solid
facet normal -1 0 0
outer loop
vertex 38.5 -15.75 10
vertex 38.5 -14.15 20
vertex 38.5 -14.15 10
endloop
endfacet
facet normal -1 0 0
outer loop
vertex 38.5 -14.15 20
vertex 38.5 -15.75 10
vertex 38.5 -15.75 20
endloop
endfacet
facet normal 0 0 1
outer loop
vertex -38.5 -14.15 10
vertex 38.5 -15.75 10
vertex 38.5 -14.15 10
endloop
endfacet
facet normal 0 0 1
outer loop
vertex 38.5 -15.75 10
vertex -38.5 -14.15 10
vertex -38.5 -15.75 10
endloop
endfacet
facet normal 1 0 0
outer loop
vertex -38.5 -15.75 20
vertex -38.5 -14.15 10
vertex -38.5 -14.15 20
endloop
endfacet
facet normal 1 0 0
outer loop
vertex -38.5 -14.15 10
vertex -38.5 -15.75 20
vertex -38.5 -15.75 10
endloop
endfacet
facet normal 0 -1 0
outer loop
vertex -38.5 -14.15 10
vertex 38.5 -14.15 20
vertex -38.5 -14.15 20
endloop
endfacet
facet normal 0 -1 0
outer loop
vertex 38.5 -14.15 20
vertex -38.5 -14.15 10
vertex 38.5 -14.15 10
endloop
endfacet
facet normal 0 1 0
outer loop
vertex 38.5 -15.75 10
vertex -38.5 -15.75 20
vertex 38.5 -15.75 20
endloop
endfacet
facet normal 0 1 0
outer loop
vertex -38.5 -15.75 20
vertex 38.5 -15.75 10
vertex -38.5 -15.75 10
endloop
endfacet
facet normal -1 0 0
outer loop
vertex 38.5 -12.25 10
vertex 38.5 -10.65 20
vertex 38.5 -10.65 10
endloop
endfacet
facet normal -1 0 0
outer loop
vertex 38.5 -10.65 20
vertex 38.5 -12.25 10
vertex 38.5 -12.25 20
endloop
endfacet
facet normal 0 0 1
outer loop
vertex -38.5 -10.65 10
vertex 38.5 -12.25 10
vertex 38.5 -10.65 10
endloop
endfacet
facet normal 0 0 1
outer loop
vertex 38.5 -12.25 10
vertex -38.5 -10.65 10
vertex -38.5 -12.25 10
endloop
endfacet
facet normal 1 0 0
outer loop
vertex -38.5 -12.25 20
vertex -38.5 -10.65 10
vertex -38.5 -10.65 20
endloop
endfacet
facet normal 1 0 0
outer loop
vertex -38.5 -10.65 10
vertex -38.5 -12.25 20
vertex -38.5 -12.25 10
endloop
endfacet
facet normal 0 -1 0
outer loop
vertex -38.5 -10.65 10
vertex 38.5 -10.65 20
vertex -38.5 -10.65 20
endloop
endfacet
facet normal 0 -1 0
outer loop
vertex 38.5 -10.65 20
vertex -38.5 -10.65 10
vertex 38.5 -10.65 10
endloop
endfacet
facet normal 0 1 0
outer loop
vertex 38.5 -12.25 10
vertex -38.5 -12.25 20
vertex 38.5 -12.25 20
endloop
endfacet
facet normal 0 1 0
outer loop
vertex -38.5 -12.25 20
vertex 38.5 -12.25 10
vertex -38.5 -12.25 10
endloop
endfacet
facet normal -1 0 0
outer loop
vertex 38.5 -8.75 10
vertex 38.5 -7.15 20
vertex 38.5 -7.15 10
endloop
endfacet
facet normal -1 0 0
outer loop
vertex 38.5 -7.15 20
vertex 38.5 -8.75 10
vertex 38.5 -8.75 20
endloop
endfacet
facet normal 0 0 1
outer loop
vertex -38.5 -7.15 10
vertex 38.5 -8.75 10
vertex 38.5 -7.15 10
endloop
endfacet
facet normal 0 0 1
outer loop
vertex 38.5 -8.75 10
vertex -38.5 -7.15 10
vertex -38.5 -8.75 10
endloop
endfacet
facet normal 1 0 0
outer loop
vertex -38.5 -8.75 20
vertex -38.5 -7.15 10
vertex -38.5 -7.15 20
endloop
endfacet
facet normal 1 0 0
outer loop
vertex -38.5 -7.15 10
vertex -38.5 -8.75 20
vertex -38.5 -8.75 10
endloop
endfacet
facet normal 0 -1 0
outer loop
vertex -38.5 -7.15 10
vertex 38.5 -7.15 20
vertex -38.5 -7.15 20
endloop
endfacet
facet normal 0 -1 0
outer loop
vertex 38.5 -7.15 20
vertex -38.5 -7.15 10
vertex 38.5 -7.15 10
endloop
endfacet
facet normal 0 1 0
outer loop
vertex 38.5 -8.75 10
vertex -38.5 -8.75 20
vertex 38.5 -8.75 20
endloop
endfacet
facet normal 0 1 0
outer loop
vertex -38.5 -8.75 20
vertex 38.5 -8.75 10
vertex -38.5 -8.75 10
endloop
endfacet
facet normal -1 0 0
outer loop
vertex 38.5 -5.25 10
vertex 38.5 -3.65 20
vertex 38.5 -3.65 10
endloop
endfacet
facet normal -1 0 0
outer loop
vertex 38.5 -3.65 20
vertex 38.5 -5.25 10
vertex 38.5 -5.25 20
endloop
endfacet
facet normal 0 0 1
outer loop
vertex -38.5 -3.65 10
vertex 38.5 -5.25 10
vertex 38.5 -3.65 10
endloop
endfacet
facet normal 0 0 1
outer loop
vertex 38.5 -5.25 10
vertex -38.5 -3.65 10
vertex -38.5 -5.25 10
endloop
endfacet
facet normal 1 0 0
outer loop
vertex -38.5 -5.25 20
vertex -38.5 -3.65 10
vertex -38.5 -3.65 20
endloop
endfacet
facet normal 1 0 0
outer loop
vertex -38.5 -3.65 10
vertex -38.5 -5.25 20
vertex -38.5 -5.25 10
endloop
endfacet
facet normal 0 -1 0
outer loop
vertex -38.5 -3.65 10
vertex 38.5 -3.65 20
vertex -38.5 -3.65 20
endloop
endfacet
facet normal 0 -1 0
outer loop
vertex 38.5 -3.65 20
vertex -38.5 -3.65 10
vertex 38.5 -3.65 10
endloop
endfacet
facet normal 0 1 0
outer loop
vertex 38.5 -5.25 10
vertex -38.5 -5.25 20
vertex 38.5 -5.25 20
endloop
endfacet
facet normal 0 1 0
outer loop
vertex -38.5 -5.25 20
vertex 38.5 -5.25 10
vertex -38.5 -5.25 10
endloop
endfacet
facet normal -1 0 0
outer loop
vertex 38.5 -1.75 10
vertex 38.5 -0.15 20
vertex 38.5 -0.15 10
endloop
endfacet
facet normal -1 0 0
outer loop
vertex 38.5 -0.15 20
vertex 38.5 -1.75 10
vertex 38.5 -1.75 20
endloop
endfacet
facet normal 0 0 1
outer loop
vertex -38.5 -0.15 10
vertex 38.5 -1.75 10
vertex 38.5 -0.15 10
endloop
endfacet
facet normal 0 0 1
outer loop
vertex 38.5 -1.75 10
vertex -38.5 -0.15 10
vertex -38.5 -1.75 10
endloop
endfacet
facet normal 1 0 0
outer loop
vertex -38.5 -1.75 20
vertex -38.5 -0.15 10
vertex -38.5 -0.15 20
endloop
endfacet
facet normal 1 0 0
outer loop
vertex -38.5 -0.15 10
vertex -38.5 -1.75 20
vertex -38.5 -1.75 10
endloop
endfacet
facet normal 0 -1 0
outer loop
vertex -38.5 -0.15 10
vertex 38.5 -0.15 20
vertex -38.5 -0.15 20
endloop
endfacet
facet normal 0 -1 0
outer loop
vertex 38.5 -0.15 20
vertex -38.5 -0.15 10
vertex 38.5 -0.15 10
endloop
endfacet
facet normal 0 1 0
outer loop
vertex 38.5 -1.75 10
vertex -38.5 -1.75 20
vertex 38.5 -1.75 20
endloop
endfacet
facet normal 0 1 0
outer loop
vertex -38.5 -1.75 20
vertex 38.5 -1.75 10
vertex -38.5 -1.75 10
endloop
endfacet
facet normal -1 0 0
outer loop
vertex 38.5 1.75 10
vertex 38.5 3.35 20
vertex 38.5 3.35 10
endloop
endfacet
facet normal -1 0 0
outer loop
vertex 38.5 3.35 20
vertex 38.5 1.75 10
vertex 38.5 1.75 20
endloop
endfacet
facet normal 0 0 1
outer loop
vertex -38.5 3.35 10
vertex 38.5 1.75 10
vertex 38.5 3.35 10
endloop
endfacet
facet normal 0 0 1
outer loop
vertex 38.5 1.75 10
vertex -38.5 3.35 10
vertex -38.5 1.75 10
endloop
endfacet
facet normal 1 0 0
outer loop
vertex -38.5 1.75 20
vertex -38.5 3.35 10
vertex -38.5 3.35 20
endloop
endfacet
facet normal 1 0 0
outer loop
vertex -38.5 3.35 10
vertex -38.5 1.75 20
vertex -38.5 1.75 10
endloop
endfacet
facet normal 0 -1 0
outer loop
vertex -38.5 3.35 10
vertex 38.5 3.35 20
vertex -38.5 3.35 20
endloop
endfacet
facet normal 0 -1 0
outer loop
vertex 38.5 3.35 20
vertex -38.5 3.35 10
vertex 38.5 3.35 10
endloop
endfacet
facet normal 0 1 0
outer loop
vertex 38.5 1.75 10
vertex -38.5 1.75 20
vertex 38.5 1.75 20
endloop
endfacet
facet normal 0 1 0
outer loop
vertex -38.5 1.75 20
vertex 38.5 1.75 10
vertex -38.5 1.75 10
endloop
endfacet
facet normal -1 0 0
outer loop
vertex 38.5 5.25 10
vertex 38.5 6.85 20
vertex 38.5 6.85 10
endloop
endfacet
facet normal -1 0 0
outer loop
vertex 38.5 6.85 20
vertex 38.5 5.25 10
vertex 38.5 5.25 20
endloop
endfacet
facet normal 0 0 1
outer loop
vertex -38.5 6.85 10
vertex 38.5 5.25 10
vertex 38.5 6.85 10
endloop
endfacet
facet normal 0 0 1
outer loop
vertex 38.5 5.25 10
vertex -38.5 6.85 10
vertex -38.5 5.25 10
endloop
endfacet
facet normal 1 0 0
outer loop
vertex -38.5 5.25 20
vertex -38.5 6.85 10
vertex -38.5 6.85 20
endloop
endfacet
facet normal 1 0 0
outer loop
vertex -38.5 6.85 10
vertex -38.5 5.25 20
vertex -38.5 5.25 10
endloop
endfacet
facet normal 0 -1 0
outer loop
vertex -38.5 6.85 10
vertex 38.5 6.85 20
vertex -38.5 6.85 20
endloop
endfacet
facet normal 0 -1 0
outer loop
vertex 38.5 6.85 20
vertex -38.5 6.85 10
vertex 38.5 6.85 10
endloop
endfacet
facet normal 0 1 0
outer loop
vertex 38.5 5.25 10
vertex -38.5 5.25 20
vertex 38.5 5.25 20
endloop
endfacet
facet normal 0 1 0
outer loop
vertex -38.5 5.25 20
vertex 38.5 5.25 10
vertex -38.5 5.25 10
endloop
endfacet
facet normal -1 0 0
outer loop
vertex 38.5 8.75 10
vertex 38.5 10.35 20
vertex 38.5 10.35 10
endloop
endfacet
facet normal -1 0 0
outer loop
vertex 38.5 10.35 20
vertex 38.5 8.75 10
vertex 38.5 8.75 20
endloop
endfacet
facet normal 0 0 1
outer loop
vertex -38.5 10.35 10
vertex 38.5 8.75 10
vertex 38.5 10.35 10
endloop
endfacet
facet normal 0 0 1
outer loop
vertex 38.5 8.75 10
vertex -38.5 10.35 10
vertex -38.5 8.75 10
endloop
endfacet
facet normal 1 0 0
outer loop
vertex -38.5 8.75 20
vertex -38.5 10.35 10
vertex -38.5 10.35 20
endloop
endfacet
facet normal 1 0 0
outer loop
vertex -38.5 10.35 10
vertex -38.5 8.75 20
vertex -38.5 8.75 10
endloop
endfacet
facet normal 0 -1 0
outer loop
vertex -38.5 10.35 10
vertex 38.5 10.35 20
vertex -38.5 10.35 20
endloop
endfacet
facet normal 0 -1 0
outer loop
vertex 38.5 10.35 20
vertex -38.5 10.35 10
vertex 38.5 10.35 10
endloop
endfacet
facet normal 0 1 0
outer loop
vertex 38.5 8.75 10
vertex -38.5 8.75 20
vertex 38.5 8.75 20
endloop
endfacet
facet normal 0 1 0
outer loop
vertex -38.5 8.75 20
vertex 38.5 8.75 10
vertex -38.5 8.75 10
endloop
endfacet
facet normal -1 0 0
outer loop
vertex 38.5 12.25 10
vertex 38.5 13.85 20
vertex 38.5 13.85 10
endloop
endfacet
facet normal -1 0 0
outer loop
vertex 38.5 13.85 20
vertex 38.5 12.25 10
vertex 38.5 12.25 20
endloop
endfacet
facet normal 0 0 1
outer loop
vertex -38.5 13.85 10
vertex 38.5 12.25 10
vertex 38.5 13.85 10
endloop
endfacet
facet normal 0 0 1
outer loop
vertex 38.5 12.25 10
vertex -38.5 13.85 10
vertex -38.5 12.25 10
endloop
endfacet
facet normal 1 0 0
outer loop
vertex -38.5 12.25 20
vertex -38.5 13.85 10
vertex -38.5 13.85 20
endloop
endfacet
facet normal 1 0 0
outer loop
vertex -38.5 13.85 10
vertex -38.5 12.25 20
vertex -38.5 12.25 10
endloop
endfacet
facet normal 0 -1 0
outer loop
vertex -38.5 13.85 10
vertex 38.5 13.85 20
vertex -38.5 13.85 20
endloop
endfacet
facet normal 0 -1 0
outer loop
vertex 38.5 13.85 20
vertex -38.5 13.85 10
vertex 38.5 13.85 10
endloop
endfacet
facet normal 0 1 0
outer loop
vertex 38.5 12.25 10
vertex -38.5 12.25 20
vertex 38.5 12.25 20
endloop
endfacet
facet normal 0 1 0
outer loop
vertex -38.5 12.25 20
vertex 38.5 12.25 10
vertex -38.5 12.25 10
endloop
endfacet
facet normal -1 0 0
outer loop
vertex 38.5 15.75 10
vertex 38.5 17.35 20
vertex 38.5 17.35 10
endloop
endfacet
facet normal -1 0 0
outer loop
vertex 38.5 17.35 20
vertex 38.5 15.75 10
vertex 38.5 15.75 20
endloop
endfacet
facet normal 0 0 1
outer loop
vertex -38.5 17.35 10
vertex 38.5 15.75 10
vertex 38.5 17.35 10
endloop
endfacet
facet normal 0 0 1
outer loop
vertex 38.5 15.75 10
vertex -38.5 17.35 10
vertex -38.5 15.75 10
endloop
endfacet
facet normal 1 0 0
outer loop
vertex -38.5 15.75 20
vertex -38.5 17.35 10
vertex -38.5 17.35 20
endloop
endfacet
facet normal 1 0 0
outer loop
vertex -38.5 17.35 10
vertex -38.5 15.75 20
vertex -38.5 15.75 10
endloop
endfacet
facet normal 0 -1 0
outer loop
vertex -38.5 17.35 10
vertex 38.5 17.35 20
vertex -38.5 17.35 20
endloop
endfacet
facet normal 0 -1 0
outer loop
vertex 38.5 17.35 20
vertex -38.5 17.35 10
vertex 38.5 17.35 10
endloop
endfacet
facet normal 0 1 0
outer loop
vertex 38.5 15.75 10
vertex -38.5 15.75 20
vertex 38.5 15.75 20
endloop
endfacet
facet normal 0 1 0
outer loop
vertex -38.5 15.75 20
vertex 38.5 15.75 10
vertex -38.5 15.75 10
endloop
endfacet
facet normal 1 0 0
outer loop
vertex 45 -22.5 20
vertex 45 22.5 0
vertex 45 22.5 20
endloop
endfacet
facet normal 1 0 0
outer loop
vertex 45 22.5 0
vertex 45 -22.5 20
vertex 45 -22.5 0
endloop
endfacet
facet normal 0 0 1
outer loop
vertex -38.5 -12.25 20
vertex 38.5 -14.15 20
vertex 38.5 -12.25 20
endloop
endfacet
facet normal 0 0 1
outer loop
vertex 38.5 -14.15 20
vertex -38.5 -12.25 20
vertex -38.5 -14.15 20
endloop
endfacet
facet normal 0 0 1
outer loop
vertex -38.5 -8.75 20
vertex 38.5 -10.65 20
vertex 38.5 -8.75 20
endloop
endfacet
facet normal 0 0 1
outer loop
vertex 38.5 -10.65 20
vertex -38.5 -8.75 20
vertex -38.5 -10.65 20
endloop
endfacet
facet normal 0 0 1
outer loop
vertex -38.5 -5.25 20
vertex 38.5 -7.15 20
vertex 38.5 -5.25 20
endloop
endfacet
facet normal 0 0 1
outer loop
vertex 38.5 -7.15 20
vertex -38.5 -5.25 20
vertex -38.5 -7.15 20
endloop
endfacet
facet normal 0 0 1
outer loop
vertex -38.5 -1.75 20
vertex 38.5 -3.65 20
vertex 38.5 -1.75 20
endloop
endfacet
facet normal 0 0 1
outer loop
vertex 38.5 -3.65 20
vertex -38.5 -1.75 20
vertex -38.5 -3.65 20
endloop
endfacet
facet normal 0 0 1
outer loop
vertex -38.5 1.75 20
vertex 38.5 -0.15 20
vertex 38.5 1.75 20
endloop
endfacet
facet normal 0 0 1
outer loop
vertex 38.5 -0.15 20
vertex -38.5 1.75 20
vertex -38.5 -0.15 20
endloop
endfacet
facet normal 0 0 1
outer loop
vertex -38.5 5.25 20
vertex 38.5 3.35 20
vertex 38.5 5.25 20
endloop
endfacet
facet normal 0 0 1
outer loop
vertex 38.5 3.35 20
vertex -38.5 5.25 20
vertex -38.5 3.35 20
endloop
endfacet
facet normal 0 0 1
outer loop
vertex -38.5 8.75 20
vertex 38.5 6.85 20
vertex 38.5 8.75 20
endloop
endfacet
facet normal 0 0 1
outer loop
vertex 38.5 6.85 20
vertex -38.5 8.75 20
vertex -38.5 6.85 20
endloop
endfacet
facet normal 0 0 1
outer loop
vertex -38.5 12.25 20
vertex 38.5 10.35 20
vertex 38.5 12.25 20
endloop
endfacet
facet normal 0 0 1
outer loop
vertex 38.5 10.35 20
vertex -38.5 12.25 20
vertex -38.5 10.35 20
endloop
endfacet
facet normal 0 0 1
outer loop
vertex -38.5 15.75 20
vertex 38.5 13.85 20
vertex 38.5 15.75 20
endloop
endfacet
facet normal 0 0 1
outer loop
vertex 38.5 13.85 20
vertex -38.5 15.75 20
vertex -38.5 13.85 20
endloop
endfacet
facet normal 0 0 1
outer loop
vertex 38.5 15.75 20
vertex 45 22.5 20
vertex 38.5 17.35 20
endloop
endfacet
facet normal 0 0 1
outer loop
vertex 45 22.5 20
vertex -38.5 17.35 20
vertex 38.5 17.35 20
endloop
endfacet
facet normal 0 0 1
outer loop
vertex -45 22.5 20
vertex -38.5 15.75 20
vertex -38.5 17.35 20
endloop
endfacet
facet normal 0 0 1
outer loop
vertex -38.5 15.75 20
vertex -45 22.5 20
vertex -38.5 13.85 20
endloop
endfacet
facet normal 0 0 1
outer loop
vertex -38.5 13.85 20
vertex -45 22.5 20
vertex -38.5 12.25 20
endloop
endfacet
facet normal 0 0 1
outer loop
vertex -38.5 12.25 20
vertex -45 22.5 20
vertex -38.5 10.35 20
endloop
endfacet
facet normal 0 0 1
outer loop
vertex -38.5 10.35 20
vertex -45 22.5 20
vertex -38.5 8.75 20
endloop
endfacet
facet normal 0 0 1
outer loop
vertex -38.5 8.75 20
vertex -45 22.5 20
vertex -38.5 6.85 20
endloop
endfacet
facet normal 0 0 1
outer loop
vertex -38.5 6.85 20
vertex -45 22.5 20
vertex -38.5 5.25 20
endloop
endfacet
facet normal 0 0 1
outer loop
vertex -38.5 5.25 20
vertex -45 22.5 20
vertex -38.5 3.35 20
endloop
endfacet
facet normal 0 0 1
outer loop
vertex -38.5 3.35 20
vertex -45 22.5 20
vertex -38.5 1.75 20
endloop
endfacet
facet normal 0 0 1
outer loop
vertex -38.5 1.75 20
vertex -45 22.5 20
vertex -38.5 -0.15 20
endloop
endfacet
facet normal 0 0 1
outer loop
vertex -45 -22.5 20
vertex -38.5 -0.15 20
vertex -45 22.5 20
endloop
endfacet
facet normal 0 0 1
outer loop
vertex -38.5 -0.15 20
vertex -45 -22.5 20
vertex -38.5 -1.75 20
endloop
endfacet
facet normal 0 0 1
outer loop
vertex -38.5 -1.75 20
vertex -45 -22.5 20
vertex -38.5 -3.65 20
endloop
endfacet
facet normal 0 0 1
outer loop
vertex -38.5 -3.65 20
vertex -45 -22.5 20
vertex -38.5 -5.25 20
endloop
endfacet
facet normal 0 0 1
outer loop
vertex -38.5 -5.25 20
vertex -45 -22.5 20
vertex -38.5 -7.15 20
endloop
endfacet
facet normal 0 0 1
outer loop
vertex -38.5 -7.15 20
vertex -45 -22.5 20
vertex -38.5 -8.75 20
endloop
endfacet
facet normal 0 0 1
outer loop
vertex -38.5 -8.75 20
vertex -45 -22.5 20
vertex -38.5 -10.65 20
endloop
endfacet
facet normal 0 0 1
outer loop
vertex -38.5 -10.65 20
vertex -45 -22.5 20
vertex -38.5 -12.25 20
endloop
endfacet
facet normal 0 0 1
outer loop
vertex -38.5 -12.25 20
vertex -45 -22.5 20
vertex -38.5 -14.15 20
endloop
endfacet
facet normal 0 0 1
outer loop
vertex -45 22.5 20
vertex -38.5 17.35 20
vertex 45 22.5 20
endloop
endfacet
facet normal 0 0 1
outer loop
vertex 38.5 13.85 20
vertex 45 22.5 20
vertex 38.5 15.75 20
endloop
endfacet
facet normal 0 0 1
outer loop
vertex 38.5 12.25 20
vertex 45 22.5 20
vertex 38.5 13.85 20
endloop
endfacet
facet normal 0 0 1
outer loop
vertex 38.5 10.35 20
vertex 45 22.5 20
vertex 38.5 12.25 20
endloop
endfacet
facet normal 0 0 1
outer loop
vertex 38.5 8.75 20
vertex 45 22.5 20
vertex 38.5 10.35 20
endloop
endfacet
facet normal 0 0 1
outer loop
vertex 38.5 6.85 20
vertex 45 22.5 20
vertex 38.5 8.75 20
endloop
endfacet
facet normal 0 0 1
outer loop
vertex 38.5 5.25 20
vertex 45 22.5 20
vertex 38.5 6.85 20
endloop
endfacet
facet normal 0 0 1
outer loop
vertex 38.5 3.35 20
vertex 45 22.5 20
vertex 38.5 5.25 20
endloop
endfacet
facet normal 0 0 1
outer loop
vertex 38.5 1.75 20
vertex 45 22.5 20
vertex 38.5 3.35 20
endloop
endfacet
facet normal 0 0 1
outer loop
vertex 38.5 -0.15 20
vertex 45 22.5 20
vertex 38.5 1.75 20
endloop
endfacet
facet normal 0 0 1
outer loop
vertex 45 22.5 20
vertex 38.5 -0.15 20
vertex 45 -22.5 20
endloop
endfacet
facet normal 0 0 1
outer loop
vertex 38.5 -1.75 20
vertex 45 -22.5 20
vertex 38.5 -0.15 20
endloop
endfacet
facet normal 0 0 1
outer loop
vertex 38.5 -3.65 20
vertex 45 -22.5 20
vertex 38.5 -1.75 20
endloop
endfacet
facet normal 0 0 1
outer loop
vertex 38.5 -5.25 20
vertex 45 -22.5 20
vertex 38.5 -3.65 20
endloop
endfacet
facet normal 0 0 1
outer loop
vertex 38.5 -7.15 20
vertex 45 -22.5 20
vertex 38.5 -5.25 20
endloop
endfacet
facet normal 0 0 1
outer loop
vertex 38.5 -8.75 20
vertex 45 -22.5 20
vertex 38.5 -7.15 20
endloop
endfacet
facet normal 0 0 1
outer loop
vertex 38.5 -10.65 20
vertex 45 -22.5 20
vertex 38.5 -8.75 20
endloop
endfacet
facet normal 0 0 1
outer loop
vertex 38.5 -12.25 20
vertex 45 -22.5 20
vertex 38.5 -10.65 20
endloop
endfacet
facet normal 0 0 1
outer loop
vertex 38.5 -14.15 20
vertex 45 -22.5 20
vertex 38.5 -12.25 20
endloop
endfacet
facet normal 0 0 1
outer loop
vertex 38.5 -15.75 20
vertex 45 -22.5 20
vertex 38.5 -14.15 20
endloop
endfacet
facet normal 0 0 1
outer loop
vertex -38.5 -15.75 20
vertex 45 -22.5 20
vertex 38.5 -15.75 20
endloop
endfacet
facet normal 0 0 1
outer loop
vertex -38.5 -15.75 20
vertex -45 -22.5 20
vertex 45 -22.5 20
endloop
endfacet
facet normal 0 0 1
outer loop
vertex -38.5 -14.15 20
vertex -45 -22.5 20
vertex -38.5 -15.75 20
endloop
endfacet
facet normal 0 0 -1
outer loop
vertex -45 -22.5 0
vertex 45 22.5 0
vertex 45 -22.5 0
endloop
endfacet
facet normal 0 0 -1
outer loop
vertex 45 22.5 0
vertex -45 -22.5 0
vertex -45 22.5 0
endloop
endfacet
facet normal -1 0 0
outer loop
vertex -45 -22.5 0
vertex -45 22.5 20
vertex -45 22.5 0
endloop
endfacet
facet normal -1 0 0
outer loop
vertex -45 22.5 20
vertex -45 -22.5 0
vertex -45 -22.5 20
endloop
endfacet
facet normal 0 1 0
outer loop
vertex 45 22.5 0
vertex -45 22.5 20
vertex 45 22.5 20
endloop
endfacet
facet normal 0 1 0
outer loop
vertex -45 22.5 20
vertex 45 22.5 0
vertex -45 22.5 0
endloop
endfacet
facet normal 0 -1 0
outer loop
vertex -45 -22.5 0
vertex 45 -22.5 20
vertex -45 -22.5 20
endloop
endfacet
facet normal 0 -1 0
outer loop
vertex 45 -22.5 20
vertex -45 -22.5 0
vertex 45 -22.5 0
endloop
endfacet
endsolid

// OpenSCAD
// Microscope slide drying rack
// Units: mm

// ---- Block ----
block_len   = 90;    // block length (X)
block_wid   = 45;    // block width (Y)
block_ht    = 20;    // block height (Z)

// ---- Slots ----
slot_count  = 10;    // number of slide slots
slot_len    = 77;    // slot length along X
slot_wid    = 1.6;   // slot width along Y
slot_depth  = 10;    // slot depth from top face
slot_pitch  = 3.5;   // centre-to-centre spacing along Y

// ---- Misc ----
eps         = 0.5;   // overshoot for clean cuts
$fn         = 64;

difference() {
    // Base block, centred in X/Y, resting on z = 0
    translate([-block_len/2, -block_wid/2, 0])
        cube([block_len, block_wid, block_ht]);

    // Row of parallel slots, centred on the block
    for (i = [0 : slot_count - 1]) {
        y = (i - (slot_count - 1)/2) * slot_pitch;
        translate([-slot_len/2, y, block_ht - slot_depth])
            cube([slot_len, slot_wid, slot_depth + eps]);
    }
}
